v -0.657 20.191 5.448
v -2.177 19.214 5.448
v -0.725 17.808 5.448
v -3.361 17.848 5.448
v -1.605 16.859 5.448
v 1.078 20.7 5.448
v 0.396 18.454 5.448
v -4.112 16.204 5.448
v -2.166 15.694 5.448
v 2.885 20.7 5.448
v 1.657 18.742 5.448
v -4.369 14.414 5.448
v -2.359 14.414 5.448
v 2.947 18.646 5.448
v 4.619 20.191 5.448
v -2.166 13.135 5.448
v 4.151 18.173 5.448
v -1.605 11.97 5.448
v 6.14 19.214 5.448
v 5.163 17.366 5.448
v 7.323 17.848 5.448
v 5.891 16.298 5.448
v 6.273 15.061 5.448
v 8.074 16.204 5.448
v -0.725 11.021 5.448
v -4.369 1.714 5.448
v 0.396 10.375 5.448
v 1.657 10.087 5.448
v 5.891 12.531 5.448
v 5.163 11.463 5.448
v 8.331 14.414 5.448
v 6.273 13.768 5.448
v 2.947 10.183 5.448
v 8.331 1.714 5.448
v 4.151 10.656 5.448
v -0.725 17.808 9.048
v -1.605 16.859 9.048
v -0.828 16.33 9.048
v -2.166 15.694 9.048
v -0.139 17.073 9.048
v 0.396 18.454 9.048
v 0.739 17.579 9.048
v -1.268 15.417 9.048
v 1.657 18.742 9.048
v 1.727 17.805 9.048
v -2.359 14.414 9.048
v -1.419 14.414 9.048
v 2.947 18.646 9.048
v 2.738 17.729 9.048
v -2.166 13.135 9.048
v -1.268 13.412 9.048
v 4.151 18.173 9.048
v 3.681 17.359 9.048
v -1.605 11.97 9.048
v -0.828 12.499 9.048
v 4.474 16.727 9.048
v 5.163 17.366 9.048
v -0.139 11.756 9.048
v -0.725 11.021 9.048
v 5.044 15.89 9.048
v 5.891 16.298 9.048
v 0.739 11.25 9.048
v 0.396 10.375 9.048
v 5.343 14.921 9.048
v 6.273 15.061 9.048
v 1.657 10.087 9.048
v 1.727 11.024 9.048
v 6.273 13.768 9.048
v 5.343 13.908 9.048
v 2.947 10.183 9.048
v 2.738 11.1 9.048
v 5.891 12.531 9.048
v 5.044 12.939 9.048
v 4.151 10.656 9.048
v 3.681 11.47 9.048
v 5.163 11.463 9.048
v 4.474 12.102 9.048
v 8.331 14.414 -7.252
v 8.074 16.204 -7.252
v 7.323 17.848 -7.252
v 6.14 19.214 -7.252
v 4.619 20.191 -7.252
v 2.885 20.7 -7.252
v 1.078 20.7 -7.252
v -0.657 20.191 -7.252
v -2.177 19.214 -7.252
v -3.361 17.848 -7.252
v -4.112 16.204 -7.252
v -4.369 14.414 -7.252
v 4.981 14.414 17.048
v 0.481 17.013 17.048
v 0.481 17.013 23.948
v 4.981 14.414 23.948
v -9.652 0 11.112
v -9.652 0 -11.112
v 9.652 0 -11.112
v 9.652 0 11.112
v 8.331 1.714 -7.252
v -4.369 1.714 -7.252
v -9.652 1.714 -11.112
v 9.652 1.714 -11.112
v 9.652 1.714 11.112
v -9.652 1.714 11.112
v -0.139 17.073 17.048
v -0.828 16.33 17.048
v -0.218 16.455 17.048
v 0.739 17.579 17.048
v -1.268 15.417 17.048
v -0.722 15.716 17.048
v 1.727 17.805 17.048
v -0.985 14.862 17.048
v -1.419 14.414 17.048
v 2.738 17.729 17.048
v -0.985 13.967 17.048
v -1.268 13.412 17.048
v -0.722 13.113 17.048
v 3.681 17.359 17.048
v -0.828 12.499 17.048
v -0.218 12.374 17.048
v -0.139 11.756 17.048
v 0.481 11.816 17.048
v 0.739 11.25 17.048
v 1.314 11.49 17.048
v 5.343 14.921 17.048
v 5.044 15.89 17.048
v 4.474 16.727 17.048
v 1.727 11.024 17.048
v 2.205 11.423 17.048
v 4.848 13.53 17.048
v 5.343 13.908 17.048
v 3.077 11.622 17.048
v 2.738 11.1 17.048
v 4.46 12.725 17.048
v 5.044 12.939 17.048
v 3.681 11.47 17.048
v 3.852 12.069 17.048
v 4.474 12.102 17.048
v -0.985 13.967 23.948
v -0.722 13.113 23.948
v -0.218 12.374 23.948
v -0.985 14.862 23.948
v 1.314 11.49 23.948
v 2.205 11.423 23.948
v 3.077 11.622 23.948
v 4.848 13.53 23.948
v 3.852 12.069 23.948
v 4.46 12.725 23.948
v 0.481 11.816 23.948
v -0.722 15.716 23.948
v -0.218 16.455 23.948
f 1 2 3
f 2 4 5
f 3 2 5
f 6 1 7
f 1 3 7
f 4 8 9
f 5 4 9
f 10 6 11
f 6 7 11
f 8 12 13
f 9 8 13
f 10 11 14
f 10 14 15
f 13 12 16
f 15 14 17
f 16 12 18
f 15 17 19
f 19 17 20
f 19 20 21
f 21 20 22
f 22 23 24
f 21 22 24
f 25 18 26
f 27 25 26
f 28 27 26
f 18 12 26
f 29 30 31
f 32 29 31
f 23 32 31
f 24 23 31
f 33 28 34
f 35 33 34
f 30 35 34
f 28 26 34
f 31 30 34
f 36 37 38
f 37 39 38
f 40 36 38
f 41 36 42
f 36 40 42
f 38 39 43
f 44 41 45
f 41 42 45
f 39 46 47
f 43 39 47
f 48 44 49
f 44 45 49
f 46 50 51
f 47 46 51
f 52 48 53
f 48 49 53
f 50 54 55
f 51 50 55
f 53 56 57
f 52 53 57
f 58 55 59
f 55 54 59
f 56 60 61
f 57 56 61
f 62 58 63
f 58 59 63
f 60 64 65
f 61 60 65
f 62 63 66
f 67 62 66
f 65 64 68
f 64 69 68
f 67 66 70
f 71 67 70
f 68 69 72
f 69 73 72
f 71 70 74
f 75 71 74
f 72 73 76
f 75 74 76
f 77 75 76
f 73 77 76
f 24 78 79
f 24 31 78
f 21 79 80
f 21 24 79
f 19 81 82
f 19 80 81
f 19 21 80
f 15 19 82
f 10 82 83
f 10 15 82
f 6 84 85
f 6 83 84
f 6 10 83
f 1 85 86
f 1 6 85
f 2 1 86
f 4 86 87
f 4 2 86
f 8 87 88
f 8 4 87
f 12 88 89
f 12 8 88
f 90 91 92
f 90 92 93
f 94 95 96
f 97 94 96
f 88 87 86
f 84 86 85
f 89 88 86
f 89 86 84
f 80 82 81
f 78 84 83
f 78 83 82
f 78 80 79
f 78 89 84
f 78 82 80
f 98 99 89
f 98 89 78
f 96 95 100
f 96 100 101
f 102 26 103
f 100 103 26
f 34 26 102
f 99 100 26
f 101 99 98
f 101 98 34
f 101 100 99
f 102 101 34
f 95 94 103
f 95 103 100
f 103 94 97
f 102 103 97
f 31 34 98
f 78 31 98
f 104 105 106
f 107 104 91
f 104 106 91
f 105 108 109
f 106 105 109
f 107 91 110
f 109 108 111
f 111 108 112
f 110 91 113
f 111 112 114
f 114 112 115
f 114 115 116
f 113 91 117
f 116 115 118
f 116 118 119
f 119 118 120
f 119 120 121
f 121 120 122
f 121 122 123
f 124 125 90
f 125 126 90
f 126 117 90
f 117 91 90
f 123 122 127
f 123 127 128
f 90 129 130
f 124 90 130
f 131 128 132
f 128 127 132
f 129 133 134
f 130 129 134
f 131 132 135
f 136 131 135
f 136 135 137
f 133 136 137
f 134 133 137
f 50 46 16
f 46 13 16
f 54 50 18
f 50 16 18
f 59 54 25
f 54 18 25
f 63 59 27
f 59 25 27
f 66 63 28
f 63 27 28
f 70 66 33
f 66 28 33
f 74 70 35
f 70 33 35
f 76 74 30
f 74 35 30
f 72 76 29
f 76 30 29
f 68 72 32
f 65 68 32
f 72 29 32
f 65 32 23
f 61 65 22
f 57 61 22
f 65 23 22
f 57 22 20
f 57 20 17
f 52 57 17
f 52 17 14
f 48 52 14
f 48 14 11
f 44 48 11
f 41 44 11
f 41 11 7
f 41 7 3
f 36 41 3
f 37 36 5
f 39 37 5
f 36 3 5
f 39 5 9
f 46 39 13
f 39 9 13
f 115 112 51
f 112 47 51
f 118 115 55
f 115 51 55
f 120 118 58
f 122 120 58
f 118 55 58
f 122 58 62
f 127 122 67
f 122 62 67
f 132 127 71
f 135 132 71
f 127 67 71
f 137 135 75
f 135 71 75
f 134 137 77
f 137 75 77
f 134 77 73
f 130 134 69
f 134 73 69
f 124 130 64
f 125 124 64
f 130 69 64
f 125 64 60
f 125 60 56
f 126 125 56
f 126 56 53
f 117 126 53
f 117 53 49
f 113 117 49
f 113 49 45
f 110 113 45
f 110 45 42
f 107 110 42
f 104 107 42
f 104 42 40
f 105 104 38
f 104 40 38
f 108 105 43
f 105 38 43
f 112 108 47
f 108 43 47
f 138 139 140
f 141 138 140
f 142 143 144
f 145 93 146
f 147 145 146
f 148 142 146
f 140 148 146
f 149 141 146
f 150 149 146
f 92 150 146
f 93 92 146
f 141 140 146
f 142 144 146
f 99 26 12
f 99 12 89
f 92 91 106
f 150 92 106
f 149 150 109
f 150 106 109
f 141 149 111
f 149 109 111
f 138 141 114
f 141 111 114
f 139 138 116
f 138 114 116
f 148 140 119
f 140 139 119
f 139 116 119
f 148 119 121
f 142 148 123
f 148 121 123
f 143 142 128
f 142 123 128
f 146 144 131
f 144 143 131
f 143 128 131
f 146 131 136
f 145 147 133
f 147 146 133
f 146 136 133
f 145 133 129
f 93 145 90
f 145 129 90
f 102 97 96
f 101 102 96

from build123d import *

# Parameters (mm, degrees)
SKETCH1_W           = 19.304
SKETCH1_H           = 22.225
BOSS_EXTRUDE1_DEPTH = 1.7145
SKETCH2_W           = 12.7
SKETCH2_H           = 12.7
BOSS_EXTRUDE2_DEPTH = 19.05
FILLET1_RADIUS      = 6.35
FILLET1_LENGTH      = 12.7
CUT_EXTRUDE1_START  = -6.9
CUT_EXTRUDE1_DEPTH  = 6.9


with BuildPart() as part:
    # Sketch1 → Boss-Extrude1 (new body)
    with BuildSketch(Plane(origin=(0, 0, 0), x_dir=(1, 0, 0), z_dir=(0, 1, 0))):
        Rectangle(SKETCH1_W, SKETCH1_H)
    extrude(amount=BOSS_EXTRUDE1_DEPTH)

    # Sketch2 → Boss-Extrude2 (add)
    with BuildSketch(Plane(origin=(0, 1.7145, 0), x_dir=(1, 0, 0), z_dir=(0, 1, 0))):
        with Locations((1.9812, 0.9017)):
            Rectangle(SKETCH2_W, SKETCH2_H)
    extrude(amount=BOSS_EXTRUDE2_DEPTH)

    # Fillet1: full round fillet: the end face becomes a half cylinder, R = half its width
    fillet1_face = Plane((1.9812, 20.7645, -0.9017), x_dir=(0, 0, 1), z_dir=(0, 1, 0))  # on the end face: x along it, z out of the body
    fillet1_slab = fillet1_face.offset(-FILLET1_RADIUS / 2) * Box(FILLET1_LENGTH, 2 * FILLET1_RADIUS, FILLET1_RADIUS, mode=Mode.PRIVATE)  # the body's end, R deep
    fillet1_round = Plane((1.9812, 14.4145, -0.9017), x_dir=(0, 1, 0), z_dir=(0, 0, 1)) * Cylinder(FILLET1_RADIUS, FILLET1_LENGTH, mode=Mode.PRIVATE)  # its axis R under the face
    add(fillet1_slab - fillet1_round, mode=Mode.SUBTRACT)

    # Sketch6 → Revolve1 (revolve)
    with BuildSketch(Plane(origin=(0, 14.4145, 0), x_dir=(1, 0, 0), z_dir=(0, 1, 0))):
        Polygon((1.9812, -23.9483), (-1.0188, -23.9483), (-1.0188, -17.0483), (-1.4188, -17.0483), (-1.4188, -9.0483), (-2.3588, -9.0483), (-2.3588, -5.4483), (1.9812, -5.4483), align=None)
    revolve(axis=Axis((1.9812, 14.4145, 5.4483), (0, 0, 1)))

    # Sketch7 → Cut-Extrude1 (cut)
    with BuildSketch(Plane.XY.offset(23.9483).offset(CUT_EXTRUDE1_START)):
        with BuildLine():
            Line((0.4812, 17.012576211), (4.9812, 14.4145))
            ThreePointArc((4.9812, 14.4145), (3.4812, 17.012576211), (0.4812, 17.012576211))
        make_face()
    extrude(amount=CUT_EXTRUDE1_DEPTH, mode=Mode.SUBTRACT)


solid = part.part
